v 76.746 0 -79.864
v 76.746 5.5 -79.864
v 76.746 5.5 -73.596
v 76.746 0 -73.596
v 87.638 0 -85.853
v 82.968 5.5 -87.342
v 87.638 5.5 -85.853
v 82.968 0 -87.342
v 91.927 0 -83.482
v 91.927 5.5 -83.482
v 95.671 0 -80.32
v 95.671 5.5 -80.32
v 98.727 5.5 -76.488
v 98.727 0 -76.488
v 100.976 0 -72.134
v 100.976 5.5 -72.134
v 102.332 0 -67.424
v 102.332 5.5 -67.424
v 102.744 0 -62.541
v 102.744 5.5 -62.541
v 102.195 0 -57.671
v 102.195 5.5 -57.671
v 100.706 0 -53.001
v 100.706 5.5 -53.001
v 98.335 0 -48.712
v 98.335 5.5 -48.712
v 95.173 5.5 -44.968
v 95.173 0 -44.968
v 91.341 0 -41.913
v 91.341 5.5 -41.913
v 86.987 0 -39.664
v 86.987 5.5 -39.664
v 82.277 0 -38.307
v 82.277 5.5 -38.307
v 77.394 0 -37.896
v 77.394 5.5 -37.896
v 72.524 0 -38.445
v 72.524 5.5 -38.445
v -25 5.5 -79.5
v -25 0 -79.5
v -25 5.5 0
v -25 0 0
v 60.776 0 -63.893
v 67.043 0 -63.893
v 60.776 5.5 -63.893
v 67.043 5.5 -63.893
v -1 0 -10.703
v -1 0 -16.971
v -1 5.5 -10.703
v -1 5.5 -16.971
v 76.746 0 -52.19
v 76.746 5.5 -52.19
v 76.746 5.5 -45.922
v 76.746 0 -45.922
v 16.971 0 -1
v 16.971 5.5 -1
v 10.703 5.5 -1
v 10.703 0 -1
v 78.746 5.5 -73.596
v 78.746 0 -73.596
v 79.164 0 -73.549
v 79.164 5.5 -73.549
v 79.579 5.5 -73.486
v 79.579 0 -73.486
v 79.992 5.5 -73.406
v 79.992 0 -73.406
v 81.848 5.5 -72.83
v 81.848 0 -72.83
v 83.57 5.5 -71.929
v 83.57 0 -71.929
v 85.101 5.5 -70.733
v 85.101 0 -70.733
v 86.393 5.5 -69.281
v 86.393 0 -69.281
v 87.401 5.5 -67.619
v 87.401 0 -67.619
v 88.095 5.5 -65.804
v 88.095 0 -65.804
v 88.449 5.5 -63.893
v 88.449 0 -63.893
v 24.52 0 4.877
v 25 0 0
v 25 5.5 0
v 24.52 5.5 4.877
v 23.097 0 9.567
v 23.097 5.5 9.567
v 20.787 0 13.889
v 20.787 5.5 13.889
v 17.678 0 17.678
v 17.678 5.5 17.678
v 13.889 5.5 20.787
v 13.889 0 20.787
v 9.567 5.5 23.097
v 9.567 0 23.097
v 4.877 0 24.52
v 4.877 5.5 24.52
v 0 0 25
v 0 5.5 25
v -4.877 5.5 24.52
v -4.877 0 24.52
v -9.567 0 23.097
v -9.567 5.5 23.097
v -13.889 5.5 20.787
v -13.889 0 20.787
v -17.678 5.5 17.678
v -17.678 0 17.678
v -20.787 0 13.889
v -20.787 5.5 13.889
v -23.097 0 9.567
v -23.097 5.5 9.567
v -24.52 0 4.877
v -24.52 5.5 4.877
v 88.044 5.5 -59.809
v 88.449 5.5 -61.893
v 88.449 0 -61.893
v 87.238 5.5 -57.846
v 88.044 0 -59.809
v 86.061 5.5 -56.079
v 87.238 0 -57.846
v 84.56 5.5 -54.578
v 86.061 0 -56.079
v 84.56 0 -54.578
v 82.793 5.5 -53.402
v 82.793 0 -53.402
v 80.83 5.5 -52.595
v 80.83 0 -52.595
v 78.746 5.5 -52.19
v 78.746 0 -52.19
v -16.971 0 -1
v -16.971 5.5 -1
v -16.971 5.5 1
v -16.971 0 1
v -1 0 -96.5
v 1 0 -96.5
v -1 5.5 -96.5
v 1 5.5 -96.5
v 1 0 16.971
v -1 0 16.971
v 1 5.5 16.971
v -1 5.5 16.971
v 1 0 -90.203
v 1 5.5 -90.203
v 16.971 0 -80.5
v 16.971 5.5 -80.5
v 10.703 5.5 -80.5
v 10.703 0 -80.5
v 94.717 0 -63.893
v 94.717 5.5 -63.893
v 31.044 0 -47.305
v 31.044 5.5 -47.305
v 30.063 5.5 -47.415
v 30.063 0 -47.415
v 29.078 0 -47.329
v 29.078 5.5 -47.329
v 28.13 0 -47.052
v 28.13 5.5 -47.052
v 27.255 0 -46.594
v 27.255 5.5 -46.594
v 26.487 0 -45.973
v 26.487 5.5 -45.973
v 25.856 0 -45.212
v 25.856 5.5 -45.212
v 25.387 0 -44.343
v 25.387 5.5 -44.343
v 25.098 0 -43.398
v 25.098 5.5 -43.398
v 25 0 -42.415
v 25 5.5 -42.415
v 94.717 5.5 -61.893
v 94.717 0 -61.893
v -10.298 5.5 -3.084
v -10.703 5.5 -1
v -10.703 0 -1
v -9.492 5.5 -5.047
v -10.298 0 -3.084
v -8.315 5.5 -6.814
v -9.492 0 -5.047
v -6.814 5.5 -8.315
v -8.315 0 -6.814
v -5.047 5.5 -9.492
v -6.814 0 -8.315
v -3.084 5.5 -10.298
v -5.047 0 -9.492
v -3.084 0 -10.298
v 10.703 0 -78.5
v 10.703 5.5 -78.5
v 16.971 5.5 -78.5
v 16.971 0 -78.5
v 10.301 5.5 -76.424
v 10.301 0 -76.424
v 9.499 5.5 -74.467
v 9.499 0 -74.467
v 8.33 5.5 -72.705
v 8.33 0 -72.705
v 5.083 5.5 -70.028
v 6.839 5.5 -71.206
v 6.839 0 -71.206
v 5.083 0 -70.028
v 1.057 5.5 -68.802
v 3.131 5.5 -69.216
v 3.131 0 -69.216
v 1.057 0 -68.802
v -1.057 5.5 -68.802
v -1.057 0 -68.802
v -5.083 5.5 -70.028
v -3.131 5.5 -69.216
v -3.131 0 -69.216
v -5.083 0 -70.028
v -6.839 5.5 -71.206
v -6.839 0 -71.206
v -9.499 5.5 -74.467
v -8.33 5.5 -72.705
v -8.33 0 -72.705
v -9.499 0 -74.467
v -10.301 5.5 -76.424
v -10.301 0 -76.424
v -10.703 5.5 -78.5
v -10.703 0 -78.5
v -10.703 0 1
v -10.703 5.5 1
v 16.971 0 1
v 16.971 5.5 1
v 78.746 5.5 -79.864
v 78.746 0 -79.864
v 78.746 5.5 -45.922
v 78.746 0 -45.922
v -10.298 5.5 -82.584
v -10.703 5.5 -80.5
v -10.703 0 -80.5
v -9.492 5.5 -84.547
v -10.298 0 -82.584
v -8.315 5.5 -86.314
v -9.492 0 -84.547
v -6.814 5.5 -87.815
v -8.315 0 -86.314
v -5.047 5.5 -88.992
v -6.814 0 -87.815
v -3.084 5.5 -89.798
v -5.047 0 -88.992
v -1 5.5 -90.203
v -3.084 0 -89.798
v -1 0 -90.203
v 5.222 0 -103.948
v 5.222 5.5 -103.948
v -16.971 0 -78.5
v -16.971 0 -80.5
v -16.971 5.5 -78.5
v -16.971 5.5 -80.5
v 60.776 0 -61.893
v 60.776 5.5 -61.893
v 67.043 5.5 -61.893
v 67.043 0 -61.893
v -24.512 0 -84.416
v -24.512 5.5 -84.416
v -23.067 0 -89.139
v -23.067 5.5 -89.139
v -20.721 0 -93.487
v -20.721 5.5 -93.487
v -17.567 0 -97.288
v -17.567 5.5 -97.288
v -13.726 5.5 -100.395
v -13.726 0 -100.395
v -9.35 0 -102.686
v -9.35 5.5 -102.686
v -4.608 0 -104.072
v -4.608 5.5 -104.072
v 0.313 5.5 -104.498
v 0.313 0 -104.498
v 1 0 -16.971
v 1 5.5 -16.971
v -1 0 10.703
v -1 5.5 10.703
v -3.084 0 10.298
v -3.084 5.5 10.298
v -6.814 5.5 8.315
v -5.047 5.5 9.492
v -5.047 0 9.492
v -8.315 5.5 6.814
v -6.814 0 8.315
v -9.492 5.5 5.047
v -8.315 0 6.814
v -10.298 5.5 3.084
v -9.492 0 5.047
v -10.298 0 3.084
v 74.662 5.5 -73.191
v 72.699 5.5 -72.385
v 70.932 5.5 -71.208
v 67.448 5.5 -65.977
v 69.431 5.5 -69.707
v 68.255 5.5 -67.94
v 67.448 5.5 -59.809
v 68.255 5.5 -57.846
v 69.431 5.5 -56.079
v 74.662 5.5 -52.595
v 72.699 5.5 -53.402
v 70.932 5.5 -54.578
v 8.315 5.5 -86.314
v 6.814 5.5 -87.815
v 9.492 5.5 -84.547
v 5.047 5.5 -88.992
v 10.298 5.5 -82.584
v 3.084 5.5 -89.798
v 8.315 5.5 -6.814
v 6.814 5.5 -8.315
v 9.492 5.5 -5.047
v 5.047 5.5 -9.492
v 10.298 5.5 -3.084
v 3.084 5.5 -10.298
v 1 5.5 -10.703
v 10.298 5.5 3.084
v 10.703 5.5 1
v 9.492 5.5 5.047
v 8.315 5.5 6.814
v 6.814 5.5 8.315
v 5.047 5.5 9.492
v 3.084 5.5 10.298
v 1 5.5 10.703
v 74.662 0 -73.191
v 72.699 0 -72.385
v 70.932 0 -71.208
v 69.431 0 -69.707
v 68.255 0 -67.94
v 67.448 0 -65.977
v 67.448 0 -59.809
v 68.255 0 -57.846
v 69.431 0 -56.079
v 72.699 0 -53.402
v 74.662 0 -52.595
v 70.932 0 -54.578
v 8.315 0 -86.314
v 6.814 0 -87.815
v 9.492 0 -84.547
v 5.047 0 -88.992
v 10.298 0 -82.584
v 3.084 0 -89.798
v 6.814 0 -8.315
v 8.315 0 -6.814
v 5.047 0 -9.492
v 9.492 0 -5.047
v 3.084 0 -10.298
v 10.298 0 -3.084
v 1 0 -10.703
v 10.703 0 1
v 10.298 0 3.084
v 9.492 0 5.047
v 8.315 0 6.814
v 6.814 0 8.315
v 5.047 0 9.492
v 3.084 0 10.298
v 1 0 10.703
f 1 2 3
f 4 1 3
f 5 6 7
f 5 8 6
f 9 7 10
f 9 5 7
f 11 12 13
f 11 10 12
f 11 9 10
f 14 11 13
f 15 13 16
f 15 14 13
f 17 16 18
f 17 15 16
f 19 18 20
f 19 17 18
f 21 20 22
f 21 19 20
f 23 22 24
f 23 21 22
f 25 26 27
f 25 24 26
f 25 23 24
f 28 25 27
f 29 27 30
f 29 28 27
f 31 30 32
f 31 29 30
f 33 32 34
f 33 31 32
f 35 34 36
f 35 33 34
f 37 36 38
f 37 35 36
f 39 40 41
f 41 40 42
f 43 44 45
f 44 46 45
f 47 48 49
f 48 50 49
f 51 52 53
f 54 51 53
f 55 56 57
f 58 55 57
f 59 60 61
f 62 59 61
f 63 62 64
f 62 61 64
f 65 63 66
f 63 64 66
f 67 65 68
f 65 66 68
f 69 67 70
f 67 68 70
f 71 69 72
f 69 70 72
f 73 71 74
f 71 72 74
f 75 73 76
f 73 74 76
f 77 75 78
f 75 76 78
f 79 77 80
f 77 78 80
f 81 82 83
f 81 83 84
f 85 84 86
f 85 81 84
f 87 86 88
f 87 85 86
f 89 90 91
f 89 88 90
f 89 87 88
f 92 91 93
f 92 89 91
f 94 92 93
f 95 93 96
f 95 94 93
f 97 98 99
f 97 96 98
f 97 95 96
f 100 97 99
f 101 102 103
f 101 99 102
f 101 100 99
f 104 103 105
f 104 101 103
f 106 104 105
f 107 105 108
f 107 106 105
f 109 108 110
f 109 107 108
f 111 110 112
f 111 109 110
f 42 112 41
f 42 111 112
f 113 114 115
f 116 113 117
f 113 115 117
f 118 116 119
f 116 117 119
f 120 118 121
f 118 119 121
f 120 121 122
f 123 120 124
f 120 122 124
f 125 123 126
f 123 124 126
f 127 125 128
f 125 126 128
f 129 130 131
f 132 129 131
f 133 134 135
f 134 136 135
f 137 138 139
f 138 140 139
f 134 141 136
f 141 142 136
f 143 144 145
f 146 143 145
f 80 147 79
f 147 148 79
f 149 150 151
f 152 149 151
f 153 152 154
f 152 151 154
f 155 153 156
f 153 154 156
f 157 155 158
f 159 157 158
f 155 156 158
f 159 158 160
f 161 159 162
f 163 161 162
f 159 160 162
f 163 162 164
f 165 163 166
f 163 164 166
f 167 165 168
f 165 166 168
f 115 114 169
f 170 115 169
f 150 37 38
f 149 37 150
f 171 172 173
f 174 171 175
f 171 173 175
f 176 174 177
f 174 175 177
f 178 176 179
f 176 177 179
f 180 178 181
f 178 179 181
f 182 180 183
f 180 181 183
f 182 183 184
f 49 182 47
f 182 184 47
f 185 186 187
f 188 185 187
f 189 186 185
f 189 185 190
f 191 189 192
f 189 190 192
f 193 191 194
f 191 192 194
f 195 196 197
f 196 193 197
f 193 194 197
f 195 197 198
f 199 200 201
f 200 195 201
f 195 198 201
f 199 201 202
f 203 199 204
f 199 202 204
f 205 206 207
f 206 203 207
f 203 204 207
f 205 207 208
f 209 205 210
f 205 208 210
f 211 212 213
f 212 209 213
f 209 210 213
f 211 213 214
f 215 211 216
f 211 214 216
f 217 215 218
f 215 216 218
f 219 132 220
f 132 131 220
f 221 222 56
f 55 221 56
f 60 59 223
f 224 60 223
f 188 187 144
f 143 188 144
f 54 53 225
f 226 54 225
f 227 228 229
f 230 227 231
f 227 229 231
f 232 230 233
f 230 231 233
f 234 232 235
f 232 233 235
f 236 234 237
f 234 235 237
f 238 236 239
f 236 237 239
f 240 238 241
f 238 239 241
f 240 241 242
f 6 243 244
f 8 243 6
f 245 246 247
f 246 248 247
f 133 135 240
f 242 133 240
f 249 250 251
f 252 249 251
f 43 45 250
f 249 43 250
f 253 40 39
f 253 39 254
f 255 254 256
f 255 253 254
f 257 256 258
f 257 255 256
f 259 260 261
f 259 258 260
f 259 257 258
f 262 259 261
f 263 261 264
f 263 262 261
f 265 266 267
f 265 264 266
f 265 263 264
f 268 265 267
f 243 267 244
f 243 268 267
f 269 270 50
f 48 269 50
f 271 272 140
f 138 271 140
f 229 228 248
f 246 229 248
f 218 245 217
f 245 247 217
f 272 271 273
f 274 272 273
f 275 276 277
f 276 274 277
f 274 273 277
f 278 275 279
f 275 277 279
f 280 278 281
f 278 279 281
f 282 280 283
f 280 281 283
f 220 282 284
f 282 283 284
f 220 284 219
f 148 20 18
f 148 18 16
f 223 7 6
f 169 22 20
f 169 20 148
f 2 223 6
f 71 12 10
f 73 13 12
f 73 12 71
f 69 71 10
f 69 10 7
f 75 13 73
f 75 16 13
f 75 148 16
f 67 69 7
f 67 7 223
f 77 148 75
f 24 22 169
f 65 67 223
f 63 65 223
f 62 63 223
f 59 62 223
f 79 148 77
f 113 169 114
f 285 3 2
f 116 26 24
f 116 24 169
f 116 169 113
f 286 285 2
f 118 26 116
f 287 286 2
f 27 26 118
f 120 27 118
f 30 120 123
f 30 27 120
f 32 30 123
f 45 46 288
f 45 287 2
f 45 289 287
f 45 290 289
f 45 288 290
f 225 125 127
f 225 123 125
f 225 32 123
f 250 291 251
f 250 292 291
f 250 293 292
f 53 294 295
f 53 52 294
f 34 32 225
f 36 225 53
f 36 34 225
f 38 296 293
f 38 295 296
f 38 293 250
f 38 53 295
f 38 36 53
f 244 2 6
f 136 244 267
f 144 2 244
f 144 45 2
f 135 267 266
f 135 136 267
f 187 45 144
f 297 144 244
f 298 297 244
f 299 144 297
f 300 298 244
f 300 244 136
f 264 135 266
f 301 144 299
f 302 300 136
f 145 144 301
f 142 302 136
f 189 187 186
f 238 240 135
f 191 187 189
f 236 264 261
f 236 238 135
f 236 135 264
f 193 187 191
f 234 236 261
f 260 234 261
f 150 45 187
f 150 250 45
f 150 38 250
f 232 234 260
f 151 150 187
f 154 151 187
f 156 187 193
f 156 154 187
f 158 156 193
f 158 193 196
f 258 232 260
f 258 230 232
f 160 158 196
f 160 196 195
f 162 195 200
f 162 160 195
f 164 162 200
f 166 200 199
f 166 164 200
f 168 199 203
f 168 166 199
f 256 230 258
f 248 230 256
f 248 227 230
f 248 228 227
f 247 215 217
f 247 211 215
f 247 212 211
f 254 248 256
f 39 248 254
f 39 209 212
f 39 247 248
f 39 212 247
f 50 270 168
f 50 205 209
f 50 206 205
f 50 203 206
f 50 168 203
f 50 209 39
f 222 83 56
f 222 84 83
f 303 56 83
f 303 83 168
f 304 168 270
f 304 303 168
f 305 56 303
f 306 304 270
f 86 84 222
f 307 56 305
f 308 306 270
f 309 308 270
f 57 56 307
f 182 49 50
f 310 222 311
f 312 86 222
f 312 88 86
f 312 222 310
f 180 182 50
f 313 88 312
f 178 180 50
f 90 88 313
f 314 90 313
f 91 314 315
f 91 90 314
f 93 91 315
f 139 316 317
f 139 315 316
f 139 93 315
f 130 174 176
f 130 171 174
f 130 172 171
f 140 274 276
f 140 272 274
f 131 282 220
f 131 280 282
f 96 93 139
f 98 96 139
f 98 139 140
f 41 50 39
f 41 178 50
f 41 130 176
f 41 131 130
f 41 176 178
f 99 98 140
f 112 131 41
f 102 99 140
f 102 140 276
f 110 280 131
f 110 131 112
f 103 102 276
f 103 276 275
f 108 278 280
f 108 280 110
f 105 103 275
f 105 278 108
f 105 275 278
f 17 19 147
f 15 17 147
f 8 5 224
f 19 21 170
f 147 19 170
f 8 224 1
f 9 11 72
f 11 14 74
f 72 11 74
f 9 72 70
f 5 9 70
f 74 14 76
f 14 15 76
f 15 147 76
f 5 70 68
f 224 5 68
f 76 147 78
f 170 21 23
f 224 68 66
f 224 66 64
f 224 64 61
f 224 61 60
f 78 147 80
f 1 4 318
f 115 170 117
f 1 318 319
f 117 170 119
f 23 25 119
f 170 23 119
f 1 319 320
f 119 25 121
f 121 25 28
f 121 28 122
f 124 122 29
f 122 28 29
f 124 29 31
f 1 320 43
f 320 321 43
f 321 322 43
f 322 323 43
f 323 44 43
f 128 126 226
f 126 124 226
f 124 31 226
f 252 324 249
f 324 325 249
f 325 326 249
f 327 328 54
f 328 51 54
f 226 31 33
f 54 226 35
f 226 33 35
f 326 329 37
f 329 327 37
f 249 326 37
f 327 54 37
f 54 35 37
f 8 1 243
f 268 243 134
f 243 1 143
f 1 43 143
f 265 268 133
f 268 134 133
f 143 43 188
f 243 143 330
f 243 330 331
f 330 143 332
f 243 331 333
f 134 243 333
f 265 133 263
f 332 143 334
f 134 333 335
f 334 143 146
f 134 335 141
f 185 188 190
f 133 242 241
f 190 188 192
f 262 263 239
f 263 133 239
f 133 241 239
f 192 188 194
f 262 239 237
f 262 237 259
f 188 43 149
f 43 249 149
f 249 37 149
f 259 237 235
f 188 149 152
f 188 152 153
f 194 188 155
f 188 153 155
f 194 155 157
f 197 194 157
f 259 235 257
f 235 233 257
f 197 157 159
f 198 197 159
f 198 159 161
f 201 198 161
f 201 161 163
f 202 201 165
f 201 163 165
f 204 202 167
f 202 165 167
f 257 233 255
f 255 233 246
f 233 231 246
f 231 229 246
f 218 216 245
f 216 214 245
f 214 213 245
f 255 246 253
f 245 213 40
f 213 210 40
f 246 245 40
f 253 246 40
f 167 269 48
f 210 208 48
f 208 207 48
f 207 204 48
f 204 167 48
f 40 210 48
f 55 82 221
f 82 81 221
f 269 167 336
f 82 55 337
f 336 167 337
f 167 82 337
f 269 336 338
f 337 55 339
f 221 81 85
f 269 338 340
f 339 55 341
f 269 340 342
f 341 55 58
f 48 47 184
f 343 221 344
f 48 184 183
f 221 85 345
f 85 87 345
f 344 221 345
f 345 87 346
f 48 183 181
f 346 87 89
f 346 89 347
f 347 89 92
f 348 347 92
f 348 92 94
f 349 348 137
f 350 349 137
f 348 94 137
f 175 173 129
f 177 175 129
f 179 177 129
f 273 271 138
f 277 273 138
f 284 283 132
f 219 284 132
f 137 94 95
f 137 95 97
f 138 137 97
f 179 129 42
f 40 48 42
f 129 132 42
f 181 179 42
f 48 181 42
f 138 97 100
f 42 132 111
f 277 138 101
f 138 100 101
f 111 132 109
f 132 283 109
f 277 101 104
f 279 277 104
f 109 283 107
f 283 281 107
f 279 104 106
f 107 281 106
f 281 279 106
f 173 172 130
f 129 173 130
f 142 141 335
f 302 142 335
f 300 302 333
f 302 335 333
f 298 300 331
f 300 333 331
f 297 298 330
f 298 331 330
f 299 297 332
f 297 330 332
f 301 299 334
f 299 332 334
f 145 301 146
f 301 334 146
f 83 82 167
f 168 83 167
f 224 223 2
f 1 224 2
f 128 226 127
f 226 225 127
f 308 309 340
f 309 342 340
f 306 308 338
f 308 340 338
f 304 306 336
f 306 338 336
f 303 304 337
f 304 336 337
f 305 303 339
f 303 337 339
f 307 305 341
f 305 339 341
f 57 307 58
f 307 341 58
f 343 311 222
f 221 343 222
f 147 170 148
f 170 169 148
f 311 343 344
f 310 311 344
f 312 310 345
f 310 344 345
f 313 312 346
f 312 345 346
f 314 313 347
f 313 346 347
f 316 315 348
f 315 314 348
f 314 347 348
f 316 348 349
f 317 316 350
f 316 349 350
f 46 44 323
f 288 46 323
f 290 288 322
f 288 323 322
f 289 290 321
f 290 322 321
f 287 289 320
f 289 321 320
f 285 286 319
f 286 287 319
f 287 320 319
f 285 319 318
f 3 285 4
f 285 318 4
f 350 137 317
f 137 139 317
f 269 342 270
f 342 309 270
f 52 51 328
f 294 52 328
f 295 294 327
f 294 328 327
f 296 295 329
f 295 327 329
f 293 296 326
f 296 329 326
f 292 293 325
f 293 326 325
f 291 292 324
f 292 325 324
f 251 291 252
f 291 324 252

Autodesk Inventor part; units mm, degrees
ref_plane "YZ Plane" through (0, 0, 0) normal (1, 0, 0) x (0, 1, 0)
ref_plane "XZ Plane" through (0, 0, 0) normal (0, 1, 0) x (-1, 0, 0)
ref_plane "XY Plane" through (0, 0, 0) normal (0, 0, 1) x (1, 0, 0)
sketch "スケッチ1" plane through (0, 0, 0) normal (0, 1, 0) x (-1, 0, 0)
  line L0 (25, 0) -> (-25, 0)
  line L1 (-25, 0) -> (-25, -104.5)
  line L2 (-25, -104.5) -> (25, -104.5) construction
  line L3 (25, -104.5) -> (25, 0)
  circle A0 centre (0, 0) radius 25
  circle A1 centre (0, 0) radius 57 construction
  circle A2 centre (0, -79.5) radius 22.5 construction
  circle A3 centre (0, 0) radius 75 construction
  circle A4 centre (0, -79.5) radius 10.75
  circle A5 centre (0, 0) radius 10.75
  circle A6 centre (-77.7461, -62.8931) radius 25
  circle A7 centre (-77.7461, -62.8931) radius 10.75
  circle A8 centre (0, -79.5) radius 25
  line L4 (-5.2223, -103.9485) -> (-82.9684, -87.3415)
  line L5 (-72.5238, -38.4446) -> (5.2223, -55.0515)
  line L6 (-77.7461, -62.8931) -> (-82.9684, -87.3415)
  point P0 (25, -79.5)
  point P1 (-25, -48.5959)
  dimension "d0" = 114
  dimension "d1" = 45
  dimension "d2" = 150
  dimension "d4" = 21.5
  dimension "d5" = 50
  dimension "d25" = 79.5
extrude "押し出し1" add sketch "スケッチ1" along normal blind 5.5 contours A0 L0 A5 | L0 A5 A0 | L3 A8 L5 L1 A0 | A8 | A8 L1 L5 | L4 L1 A8 | L1 L4 A6 L5 | A6
sketch "スケッチ4" plane through (0, 5.5, 0) normal (0, 1, 0) x (1, 0, 0)
  line L0 (-1, 90.2034) -> (1, 90.2034)
  line L1 (1, 90.2034) -> (1, 96.5)
  line L2 (1, 96.5) -> (-1, 96.5)
  line L3 (-1, 96.5) -> (-1, 90.2034)
  arc A0 (-25, 0) -> (25, 0) centre (0, 0) ccw projected
  line L4 (25, 0) -> (25, 48.5959) projected
  line L5 (25, 48.5959) -> (72.5238, 38.4446) projected
  arc A1 (72.5238, 38.4446) -> (82.9684, 87.3415) centre (77.7461, 62.8931) ccw projected
  line L6 (82.9684, 87.3415) -> (5.2223, 103.9485) projected
  arc A2 (5.2223, 103.9485) -> (-25, 79.5) centre (0, 79.5) ccw projected
  line L7 (-25, 79.5) -> (-25, 0) projected
  circle A3 centre (0, 0) radius 10.75 projected
  circle A4 centre (77.7461, 62.8931) radius 10.75 projected
  circle A5 centre (0, 79.5) radius 10.75 projected
  circle A6 centre (0, 79.5) radius 10.75 projected
  line L8 (-16.9706, -1) -> (16.9706, -1)
  line L9 (16.9706, -1) -> (16.9706, 1)
  line L10 (16.9706, 1) -> (-16.9706, 1)
  line L11 (-16.9706, 1) -> (-16.9706, -1)
  line L12 (-1, -16.9706) -> (1, -16.9706)
  line L13 (1, -16.9706) -> (1, 16.9706)
  line L14 (1, 16.9706) -> (-1, 16.9706)
  line L15 (-1, 16.9706) -> (-1, -16.9706)
  circle A7 centre (0, 0) radius 17
  line L16 (94.7167, 63.8931) -> (60.7756, 63.8931)
  line L17 (60.7756, 63.8931) -> (60.7756, 61.8931)
  line L18 (60.7756, 61.8931) -> (94.7167, 61.8931)
  line L19 (94.7167, 61.8931) -> (94.7167, 63.8931)
  line L20 (78.7461, 79.8636) -> (76.7461, 79.8636)
  line L21 (76.7461, 79.8636) -> (76.7461, 45.9225)
  line L22 (76.7461, 45.9225) -> (78.7461, 45.9225)
  line L23 (78.7461, 45.9225) -> (78.7461, 79.8636)
  line L24 (16.9706, 80.5) -> (-16.9706, 80.5)
  line L25 (-16.9706, 80.5) -> (-16.9706, 78.5)
  line L26 (-16.9706, 78.5) -> (16.9706, 78.5)
  line L27 (16.9706, 78.5) -> (16.9706, 80.5)
  line L28 (16.9706, 80.5) -> (-16.9706, 78.5) construction
  line L29 (-16.9706, 80.5) -> (16.9706, 78.5) construction
  point P0 (0, 96.5)
  point P1 (-16.9706, 0)
  point P2 (0, 16.9706)
  point P3 (-1, -10.7034)
  point P4 (1, -10.7034)
  point P5 (10.7034, 1)
  point P6 (10.7034, -1)
  point P7 (-1, 10.7034)
  point P8 (1, 10.7034)
  point P9 (-10.7034, -1)
  point P10 (-10.7034, 1)
  point P11 (60.7756, 62.8931)
  point P12 (77.7461, 45.9225)
  point P13 (77.7461, 61.8931)
  point P14 (76.7461, 62.8931)
  point P15 (88.4495, 63.8931)
  point P16 (78.7461, 73.5965)
  point P17 (76.7461, 73.5965)
  point P18 (67.0427, 63.8931)
  point P19 (67.0427, 61.8931)
  point P20 (76.7461, 52.1897)
  point P21 (78.7461, 52.1897)
  point P22 (88.4495, 61.8931)
  dimension "d26" = 17
  dimension "d27" = 2
  dimension "d30" = 34
extrude "押し出し4" cut sketch "スケッチ4" against normal through all contours A5 L0 | L3 L2 L1 A5 | L24 A5 L26 | A5 L26 L25 L24 | L24 L27 L26 A5 | A3 L10 L9 L8 | A3 L15 L14 L13 | L13 L12 L15 A3 | A3 L8 L11 L10 | A4 L18 L23 L16 | A4 L16 L19 L18 | L16 L23 A4 | A4 L23 L18 | L23 L16 L21 A4 | A4 L21 L20 L23 | L23 L18 L21 L16 | L23 L22 L21 A4 | A4 L21 L18 L23 | L21 L16 A4 | L21 L18 A4 L16 | A4 L18 L21 | A4 L18 L17 L16
fillet "フィレット1" radius 5 1 edges at (25, 2.75, -48.5959)
properties part number "gear_plate_1" material "木材 (カエデ材)"
